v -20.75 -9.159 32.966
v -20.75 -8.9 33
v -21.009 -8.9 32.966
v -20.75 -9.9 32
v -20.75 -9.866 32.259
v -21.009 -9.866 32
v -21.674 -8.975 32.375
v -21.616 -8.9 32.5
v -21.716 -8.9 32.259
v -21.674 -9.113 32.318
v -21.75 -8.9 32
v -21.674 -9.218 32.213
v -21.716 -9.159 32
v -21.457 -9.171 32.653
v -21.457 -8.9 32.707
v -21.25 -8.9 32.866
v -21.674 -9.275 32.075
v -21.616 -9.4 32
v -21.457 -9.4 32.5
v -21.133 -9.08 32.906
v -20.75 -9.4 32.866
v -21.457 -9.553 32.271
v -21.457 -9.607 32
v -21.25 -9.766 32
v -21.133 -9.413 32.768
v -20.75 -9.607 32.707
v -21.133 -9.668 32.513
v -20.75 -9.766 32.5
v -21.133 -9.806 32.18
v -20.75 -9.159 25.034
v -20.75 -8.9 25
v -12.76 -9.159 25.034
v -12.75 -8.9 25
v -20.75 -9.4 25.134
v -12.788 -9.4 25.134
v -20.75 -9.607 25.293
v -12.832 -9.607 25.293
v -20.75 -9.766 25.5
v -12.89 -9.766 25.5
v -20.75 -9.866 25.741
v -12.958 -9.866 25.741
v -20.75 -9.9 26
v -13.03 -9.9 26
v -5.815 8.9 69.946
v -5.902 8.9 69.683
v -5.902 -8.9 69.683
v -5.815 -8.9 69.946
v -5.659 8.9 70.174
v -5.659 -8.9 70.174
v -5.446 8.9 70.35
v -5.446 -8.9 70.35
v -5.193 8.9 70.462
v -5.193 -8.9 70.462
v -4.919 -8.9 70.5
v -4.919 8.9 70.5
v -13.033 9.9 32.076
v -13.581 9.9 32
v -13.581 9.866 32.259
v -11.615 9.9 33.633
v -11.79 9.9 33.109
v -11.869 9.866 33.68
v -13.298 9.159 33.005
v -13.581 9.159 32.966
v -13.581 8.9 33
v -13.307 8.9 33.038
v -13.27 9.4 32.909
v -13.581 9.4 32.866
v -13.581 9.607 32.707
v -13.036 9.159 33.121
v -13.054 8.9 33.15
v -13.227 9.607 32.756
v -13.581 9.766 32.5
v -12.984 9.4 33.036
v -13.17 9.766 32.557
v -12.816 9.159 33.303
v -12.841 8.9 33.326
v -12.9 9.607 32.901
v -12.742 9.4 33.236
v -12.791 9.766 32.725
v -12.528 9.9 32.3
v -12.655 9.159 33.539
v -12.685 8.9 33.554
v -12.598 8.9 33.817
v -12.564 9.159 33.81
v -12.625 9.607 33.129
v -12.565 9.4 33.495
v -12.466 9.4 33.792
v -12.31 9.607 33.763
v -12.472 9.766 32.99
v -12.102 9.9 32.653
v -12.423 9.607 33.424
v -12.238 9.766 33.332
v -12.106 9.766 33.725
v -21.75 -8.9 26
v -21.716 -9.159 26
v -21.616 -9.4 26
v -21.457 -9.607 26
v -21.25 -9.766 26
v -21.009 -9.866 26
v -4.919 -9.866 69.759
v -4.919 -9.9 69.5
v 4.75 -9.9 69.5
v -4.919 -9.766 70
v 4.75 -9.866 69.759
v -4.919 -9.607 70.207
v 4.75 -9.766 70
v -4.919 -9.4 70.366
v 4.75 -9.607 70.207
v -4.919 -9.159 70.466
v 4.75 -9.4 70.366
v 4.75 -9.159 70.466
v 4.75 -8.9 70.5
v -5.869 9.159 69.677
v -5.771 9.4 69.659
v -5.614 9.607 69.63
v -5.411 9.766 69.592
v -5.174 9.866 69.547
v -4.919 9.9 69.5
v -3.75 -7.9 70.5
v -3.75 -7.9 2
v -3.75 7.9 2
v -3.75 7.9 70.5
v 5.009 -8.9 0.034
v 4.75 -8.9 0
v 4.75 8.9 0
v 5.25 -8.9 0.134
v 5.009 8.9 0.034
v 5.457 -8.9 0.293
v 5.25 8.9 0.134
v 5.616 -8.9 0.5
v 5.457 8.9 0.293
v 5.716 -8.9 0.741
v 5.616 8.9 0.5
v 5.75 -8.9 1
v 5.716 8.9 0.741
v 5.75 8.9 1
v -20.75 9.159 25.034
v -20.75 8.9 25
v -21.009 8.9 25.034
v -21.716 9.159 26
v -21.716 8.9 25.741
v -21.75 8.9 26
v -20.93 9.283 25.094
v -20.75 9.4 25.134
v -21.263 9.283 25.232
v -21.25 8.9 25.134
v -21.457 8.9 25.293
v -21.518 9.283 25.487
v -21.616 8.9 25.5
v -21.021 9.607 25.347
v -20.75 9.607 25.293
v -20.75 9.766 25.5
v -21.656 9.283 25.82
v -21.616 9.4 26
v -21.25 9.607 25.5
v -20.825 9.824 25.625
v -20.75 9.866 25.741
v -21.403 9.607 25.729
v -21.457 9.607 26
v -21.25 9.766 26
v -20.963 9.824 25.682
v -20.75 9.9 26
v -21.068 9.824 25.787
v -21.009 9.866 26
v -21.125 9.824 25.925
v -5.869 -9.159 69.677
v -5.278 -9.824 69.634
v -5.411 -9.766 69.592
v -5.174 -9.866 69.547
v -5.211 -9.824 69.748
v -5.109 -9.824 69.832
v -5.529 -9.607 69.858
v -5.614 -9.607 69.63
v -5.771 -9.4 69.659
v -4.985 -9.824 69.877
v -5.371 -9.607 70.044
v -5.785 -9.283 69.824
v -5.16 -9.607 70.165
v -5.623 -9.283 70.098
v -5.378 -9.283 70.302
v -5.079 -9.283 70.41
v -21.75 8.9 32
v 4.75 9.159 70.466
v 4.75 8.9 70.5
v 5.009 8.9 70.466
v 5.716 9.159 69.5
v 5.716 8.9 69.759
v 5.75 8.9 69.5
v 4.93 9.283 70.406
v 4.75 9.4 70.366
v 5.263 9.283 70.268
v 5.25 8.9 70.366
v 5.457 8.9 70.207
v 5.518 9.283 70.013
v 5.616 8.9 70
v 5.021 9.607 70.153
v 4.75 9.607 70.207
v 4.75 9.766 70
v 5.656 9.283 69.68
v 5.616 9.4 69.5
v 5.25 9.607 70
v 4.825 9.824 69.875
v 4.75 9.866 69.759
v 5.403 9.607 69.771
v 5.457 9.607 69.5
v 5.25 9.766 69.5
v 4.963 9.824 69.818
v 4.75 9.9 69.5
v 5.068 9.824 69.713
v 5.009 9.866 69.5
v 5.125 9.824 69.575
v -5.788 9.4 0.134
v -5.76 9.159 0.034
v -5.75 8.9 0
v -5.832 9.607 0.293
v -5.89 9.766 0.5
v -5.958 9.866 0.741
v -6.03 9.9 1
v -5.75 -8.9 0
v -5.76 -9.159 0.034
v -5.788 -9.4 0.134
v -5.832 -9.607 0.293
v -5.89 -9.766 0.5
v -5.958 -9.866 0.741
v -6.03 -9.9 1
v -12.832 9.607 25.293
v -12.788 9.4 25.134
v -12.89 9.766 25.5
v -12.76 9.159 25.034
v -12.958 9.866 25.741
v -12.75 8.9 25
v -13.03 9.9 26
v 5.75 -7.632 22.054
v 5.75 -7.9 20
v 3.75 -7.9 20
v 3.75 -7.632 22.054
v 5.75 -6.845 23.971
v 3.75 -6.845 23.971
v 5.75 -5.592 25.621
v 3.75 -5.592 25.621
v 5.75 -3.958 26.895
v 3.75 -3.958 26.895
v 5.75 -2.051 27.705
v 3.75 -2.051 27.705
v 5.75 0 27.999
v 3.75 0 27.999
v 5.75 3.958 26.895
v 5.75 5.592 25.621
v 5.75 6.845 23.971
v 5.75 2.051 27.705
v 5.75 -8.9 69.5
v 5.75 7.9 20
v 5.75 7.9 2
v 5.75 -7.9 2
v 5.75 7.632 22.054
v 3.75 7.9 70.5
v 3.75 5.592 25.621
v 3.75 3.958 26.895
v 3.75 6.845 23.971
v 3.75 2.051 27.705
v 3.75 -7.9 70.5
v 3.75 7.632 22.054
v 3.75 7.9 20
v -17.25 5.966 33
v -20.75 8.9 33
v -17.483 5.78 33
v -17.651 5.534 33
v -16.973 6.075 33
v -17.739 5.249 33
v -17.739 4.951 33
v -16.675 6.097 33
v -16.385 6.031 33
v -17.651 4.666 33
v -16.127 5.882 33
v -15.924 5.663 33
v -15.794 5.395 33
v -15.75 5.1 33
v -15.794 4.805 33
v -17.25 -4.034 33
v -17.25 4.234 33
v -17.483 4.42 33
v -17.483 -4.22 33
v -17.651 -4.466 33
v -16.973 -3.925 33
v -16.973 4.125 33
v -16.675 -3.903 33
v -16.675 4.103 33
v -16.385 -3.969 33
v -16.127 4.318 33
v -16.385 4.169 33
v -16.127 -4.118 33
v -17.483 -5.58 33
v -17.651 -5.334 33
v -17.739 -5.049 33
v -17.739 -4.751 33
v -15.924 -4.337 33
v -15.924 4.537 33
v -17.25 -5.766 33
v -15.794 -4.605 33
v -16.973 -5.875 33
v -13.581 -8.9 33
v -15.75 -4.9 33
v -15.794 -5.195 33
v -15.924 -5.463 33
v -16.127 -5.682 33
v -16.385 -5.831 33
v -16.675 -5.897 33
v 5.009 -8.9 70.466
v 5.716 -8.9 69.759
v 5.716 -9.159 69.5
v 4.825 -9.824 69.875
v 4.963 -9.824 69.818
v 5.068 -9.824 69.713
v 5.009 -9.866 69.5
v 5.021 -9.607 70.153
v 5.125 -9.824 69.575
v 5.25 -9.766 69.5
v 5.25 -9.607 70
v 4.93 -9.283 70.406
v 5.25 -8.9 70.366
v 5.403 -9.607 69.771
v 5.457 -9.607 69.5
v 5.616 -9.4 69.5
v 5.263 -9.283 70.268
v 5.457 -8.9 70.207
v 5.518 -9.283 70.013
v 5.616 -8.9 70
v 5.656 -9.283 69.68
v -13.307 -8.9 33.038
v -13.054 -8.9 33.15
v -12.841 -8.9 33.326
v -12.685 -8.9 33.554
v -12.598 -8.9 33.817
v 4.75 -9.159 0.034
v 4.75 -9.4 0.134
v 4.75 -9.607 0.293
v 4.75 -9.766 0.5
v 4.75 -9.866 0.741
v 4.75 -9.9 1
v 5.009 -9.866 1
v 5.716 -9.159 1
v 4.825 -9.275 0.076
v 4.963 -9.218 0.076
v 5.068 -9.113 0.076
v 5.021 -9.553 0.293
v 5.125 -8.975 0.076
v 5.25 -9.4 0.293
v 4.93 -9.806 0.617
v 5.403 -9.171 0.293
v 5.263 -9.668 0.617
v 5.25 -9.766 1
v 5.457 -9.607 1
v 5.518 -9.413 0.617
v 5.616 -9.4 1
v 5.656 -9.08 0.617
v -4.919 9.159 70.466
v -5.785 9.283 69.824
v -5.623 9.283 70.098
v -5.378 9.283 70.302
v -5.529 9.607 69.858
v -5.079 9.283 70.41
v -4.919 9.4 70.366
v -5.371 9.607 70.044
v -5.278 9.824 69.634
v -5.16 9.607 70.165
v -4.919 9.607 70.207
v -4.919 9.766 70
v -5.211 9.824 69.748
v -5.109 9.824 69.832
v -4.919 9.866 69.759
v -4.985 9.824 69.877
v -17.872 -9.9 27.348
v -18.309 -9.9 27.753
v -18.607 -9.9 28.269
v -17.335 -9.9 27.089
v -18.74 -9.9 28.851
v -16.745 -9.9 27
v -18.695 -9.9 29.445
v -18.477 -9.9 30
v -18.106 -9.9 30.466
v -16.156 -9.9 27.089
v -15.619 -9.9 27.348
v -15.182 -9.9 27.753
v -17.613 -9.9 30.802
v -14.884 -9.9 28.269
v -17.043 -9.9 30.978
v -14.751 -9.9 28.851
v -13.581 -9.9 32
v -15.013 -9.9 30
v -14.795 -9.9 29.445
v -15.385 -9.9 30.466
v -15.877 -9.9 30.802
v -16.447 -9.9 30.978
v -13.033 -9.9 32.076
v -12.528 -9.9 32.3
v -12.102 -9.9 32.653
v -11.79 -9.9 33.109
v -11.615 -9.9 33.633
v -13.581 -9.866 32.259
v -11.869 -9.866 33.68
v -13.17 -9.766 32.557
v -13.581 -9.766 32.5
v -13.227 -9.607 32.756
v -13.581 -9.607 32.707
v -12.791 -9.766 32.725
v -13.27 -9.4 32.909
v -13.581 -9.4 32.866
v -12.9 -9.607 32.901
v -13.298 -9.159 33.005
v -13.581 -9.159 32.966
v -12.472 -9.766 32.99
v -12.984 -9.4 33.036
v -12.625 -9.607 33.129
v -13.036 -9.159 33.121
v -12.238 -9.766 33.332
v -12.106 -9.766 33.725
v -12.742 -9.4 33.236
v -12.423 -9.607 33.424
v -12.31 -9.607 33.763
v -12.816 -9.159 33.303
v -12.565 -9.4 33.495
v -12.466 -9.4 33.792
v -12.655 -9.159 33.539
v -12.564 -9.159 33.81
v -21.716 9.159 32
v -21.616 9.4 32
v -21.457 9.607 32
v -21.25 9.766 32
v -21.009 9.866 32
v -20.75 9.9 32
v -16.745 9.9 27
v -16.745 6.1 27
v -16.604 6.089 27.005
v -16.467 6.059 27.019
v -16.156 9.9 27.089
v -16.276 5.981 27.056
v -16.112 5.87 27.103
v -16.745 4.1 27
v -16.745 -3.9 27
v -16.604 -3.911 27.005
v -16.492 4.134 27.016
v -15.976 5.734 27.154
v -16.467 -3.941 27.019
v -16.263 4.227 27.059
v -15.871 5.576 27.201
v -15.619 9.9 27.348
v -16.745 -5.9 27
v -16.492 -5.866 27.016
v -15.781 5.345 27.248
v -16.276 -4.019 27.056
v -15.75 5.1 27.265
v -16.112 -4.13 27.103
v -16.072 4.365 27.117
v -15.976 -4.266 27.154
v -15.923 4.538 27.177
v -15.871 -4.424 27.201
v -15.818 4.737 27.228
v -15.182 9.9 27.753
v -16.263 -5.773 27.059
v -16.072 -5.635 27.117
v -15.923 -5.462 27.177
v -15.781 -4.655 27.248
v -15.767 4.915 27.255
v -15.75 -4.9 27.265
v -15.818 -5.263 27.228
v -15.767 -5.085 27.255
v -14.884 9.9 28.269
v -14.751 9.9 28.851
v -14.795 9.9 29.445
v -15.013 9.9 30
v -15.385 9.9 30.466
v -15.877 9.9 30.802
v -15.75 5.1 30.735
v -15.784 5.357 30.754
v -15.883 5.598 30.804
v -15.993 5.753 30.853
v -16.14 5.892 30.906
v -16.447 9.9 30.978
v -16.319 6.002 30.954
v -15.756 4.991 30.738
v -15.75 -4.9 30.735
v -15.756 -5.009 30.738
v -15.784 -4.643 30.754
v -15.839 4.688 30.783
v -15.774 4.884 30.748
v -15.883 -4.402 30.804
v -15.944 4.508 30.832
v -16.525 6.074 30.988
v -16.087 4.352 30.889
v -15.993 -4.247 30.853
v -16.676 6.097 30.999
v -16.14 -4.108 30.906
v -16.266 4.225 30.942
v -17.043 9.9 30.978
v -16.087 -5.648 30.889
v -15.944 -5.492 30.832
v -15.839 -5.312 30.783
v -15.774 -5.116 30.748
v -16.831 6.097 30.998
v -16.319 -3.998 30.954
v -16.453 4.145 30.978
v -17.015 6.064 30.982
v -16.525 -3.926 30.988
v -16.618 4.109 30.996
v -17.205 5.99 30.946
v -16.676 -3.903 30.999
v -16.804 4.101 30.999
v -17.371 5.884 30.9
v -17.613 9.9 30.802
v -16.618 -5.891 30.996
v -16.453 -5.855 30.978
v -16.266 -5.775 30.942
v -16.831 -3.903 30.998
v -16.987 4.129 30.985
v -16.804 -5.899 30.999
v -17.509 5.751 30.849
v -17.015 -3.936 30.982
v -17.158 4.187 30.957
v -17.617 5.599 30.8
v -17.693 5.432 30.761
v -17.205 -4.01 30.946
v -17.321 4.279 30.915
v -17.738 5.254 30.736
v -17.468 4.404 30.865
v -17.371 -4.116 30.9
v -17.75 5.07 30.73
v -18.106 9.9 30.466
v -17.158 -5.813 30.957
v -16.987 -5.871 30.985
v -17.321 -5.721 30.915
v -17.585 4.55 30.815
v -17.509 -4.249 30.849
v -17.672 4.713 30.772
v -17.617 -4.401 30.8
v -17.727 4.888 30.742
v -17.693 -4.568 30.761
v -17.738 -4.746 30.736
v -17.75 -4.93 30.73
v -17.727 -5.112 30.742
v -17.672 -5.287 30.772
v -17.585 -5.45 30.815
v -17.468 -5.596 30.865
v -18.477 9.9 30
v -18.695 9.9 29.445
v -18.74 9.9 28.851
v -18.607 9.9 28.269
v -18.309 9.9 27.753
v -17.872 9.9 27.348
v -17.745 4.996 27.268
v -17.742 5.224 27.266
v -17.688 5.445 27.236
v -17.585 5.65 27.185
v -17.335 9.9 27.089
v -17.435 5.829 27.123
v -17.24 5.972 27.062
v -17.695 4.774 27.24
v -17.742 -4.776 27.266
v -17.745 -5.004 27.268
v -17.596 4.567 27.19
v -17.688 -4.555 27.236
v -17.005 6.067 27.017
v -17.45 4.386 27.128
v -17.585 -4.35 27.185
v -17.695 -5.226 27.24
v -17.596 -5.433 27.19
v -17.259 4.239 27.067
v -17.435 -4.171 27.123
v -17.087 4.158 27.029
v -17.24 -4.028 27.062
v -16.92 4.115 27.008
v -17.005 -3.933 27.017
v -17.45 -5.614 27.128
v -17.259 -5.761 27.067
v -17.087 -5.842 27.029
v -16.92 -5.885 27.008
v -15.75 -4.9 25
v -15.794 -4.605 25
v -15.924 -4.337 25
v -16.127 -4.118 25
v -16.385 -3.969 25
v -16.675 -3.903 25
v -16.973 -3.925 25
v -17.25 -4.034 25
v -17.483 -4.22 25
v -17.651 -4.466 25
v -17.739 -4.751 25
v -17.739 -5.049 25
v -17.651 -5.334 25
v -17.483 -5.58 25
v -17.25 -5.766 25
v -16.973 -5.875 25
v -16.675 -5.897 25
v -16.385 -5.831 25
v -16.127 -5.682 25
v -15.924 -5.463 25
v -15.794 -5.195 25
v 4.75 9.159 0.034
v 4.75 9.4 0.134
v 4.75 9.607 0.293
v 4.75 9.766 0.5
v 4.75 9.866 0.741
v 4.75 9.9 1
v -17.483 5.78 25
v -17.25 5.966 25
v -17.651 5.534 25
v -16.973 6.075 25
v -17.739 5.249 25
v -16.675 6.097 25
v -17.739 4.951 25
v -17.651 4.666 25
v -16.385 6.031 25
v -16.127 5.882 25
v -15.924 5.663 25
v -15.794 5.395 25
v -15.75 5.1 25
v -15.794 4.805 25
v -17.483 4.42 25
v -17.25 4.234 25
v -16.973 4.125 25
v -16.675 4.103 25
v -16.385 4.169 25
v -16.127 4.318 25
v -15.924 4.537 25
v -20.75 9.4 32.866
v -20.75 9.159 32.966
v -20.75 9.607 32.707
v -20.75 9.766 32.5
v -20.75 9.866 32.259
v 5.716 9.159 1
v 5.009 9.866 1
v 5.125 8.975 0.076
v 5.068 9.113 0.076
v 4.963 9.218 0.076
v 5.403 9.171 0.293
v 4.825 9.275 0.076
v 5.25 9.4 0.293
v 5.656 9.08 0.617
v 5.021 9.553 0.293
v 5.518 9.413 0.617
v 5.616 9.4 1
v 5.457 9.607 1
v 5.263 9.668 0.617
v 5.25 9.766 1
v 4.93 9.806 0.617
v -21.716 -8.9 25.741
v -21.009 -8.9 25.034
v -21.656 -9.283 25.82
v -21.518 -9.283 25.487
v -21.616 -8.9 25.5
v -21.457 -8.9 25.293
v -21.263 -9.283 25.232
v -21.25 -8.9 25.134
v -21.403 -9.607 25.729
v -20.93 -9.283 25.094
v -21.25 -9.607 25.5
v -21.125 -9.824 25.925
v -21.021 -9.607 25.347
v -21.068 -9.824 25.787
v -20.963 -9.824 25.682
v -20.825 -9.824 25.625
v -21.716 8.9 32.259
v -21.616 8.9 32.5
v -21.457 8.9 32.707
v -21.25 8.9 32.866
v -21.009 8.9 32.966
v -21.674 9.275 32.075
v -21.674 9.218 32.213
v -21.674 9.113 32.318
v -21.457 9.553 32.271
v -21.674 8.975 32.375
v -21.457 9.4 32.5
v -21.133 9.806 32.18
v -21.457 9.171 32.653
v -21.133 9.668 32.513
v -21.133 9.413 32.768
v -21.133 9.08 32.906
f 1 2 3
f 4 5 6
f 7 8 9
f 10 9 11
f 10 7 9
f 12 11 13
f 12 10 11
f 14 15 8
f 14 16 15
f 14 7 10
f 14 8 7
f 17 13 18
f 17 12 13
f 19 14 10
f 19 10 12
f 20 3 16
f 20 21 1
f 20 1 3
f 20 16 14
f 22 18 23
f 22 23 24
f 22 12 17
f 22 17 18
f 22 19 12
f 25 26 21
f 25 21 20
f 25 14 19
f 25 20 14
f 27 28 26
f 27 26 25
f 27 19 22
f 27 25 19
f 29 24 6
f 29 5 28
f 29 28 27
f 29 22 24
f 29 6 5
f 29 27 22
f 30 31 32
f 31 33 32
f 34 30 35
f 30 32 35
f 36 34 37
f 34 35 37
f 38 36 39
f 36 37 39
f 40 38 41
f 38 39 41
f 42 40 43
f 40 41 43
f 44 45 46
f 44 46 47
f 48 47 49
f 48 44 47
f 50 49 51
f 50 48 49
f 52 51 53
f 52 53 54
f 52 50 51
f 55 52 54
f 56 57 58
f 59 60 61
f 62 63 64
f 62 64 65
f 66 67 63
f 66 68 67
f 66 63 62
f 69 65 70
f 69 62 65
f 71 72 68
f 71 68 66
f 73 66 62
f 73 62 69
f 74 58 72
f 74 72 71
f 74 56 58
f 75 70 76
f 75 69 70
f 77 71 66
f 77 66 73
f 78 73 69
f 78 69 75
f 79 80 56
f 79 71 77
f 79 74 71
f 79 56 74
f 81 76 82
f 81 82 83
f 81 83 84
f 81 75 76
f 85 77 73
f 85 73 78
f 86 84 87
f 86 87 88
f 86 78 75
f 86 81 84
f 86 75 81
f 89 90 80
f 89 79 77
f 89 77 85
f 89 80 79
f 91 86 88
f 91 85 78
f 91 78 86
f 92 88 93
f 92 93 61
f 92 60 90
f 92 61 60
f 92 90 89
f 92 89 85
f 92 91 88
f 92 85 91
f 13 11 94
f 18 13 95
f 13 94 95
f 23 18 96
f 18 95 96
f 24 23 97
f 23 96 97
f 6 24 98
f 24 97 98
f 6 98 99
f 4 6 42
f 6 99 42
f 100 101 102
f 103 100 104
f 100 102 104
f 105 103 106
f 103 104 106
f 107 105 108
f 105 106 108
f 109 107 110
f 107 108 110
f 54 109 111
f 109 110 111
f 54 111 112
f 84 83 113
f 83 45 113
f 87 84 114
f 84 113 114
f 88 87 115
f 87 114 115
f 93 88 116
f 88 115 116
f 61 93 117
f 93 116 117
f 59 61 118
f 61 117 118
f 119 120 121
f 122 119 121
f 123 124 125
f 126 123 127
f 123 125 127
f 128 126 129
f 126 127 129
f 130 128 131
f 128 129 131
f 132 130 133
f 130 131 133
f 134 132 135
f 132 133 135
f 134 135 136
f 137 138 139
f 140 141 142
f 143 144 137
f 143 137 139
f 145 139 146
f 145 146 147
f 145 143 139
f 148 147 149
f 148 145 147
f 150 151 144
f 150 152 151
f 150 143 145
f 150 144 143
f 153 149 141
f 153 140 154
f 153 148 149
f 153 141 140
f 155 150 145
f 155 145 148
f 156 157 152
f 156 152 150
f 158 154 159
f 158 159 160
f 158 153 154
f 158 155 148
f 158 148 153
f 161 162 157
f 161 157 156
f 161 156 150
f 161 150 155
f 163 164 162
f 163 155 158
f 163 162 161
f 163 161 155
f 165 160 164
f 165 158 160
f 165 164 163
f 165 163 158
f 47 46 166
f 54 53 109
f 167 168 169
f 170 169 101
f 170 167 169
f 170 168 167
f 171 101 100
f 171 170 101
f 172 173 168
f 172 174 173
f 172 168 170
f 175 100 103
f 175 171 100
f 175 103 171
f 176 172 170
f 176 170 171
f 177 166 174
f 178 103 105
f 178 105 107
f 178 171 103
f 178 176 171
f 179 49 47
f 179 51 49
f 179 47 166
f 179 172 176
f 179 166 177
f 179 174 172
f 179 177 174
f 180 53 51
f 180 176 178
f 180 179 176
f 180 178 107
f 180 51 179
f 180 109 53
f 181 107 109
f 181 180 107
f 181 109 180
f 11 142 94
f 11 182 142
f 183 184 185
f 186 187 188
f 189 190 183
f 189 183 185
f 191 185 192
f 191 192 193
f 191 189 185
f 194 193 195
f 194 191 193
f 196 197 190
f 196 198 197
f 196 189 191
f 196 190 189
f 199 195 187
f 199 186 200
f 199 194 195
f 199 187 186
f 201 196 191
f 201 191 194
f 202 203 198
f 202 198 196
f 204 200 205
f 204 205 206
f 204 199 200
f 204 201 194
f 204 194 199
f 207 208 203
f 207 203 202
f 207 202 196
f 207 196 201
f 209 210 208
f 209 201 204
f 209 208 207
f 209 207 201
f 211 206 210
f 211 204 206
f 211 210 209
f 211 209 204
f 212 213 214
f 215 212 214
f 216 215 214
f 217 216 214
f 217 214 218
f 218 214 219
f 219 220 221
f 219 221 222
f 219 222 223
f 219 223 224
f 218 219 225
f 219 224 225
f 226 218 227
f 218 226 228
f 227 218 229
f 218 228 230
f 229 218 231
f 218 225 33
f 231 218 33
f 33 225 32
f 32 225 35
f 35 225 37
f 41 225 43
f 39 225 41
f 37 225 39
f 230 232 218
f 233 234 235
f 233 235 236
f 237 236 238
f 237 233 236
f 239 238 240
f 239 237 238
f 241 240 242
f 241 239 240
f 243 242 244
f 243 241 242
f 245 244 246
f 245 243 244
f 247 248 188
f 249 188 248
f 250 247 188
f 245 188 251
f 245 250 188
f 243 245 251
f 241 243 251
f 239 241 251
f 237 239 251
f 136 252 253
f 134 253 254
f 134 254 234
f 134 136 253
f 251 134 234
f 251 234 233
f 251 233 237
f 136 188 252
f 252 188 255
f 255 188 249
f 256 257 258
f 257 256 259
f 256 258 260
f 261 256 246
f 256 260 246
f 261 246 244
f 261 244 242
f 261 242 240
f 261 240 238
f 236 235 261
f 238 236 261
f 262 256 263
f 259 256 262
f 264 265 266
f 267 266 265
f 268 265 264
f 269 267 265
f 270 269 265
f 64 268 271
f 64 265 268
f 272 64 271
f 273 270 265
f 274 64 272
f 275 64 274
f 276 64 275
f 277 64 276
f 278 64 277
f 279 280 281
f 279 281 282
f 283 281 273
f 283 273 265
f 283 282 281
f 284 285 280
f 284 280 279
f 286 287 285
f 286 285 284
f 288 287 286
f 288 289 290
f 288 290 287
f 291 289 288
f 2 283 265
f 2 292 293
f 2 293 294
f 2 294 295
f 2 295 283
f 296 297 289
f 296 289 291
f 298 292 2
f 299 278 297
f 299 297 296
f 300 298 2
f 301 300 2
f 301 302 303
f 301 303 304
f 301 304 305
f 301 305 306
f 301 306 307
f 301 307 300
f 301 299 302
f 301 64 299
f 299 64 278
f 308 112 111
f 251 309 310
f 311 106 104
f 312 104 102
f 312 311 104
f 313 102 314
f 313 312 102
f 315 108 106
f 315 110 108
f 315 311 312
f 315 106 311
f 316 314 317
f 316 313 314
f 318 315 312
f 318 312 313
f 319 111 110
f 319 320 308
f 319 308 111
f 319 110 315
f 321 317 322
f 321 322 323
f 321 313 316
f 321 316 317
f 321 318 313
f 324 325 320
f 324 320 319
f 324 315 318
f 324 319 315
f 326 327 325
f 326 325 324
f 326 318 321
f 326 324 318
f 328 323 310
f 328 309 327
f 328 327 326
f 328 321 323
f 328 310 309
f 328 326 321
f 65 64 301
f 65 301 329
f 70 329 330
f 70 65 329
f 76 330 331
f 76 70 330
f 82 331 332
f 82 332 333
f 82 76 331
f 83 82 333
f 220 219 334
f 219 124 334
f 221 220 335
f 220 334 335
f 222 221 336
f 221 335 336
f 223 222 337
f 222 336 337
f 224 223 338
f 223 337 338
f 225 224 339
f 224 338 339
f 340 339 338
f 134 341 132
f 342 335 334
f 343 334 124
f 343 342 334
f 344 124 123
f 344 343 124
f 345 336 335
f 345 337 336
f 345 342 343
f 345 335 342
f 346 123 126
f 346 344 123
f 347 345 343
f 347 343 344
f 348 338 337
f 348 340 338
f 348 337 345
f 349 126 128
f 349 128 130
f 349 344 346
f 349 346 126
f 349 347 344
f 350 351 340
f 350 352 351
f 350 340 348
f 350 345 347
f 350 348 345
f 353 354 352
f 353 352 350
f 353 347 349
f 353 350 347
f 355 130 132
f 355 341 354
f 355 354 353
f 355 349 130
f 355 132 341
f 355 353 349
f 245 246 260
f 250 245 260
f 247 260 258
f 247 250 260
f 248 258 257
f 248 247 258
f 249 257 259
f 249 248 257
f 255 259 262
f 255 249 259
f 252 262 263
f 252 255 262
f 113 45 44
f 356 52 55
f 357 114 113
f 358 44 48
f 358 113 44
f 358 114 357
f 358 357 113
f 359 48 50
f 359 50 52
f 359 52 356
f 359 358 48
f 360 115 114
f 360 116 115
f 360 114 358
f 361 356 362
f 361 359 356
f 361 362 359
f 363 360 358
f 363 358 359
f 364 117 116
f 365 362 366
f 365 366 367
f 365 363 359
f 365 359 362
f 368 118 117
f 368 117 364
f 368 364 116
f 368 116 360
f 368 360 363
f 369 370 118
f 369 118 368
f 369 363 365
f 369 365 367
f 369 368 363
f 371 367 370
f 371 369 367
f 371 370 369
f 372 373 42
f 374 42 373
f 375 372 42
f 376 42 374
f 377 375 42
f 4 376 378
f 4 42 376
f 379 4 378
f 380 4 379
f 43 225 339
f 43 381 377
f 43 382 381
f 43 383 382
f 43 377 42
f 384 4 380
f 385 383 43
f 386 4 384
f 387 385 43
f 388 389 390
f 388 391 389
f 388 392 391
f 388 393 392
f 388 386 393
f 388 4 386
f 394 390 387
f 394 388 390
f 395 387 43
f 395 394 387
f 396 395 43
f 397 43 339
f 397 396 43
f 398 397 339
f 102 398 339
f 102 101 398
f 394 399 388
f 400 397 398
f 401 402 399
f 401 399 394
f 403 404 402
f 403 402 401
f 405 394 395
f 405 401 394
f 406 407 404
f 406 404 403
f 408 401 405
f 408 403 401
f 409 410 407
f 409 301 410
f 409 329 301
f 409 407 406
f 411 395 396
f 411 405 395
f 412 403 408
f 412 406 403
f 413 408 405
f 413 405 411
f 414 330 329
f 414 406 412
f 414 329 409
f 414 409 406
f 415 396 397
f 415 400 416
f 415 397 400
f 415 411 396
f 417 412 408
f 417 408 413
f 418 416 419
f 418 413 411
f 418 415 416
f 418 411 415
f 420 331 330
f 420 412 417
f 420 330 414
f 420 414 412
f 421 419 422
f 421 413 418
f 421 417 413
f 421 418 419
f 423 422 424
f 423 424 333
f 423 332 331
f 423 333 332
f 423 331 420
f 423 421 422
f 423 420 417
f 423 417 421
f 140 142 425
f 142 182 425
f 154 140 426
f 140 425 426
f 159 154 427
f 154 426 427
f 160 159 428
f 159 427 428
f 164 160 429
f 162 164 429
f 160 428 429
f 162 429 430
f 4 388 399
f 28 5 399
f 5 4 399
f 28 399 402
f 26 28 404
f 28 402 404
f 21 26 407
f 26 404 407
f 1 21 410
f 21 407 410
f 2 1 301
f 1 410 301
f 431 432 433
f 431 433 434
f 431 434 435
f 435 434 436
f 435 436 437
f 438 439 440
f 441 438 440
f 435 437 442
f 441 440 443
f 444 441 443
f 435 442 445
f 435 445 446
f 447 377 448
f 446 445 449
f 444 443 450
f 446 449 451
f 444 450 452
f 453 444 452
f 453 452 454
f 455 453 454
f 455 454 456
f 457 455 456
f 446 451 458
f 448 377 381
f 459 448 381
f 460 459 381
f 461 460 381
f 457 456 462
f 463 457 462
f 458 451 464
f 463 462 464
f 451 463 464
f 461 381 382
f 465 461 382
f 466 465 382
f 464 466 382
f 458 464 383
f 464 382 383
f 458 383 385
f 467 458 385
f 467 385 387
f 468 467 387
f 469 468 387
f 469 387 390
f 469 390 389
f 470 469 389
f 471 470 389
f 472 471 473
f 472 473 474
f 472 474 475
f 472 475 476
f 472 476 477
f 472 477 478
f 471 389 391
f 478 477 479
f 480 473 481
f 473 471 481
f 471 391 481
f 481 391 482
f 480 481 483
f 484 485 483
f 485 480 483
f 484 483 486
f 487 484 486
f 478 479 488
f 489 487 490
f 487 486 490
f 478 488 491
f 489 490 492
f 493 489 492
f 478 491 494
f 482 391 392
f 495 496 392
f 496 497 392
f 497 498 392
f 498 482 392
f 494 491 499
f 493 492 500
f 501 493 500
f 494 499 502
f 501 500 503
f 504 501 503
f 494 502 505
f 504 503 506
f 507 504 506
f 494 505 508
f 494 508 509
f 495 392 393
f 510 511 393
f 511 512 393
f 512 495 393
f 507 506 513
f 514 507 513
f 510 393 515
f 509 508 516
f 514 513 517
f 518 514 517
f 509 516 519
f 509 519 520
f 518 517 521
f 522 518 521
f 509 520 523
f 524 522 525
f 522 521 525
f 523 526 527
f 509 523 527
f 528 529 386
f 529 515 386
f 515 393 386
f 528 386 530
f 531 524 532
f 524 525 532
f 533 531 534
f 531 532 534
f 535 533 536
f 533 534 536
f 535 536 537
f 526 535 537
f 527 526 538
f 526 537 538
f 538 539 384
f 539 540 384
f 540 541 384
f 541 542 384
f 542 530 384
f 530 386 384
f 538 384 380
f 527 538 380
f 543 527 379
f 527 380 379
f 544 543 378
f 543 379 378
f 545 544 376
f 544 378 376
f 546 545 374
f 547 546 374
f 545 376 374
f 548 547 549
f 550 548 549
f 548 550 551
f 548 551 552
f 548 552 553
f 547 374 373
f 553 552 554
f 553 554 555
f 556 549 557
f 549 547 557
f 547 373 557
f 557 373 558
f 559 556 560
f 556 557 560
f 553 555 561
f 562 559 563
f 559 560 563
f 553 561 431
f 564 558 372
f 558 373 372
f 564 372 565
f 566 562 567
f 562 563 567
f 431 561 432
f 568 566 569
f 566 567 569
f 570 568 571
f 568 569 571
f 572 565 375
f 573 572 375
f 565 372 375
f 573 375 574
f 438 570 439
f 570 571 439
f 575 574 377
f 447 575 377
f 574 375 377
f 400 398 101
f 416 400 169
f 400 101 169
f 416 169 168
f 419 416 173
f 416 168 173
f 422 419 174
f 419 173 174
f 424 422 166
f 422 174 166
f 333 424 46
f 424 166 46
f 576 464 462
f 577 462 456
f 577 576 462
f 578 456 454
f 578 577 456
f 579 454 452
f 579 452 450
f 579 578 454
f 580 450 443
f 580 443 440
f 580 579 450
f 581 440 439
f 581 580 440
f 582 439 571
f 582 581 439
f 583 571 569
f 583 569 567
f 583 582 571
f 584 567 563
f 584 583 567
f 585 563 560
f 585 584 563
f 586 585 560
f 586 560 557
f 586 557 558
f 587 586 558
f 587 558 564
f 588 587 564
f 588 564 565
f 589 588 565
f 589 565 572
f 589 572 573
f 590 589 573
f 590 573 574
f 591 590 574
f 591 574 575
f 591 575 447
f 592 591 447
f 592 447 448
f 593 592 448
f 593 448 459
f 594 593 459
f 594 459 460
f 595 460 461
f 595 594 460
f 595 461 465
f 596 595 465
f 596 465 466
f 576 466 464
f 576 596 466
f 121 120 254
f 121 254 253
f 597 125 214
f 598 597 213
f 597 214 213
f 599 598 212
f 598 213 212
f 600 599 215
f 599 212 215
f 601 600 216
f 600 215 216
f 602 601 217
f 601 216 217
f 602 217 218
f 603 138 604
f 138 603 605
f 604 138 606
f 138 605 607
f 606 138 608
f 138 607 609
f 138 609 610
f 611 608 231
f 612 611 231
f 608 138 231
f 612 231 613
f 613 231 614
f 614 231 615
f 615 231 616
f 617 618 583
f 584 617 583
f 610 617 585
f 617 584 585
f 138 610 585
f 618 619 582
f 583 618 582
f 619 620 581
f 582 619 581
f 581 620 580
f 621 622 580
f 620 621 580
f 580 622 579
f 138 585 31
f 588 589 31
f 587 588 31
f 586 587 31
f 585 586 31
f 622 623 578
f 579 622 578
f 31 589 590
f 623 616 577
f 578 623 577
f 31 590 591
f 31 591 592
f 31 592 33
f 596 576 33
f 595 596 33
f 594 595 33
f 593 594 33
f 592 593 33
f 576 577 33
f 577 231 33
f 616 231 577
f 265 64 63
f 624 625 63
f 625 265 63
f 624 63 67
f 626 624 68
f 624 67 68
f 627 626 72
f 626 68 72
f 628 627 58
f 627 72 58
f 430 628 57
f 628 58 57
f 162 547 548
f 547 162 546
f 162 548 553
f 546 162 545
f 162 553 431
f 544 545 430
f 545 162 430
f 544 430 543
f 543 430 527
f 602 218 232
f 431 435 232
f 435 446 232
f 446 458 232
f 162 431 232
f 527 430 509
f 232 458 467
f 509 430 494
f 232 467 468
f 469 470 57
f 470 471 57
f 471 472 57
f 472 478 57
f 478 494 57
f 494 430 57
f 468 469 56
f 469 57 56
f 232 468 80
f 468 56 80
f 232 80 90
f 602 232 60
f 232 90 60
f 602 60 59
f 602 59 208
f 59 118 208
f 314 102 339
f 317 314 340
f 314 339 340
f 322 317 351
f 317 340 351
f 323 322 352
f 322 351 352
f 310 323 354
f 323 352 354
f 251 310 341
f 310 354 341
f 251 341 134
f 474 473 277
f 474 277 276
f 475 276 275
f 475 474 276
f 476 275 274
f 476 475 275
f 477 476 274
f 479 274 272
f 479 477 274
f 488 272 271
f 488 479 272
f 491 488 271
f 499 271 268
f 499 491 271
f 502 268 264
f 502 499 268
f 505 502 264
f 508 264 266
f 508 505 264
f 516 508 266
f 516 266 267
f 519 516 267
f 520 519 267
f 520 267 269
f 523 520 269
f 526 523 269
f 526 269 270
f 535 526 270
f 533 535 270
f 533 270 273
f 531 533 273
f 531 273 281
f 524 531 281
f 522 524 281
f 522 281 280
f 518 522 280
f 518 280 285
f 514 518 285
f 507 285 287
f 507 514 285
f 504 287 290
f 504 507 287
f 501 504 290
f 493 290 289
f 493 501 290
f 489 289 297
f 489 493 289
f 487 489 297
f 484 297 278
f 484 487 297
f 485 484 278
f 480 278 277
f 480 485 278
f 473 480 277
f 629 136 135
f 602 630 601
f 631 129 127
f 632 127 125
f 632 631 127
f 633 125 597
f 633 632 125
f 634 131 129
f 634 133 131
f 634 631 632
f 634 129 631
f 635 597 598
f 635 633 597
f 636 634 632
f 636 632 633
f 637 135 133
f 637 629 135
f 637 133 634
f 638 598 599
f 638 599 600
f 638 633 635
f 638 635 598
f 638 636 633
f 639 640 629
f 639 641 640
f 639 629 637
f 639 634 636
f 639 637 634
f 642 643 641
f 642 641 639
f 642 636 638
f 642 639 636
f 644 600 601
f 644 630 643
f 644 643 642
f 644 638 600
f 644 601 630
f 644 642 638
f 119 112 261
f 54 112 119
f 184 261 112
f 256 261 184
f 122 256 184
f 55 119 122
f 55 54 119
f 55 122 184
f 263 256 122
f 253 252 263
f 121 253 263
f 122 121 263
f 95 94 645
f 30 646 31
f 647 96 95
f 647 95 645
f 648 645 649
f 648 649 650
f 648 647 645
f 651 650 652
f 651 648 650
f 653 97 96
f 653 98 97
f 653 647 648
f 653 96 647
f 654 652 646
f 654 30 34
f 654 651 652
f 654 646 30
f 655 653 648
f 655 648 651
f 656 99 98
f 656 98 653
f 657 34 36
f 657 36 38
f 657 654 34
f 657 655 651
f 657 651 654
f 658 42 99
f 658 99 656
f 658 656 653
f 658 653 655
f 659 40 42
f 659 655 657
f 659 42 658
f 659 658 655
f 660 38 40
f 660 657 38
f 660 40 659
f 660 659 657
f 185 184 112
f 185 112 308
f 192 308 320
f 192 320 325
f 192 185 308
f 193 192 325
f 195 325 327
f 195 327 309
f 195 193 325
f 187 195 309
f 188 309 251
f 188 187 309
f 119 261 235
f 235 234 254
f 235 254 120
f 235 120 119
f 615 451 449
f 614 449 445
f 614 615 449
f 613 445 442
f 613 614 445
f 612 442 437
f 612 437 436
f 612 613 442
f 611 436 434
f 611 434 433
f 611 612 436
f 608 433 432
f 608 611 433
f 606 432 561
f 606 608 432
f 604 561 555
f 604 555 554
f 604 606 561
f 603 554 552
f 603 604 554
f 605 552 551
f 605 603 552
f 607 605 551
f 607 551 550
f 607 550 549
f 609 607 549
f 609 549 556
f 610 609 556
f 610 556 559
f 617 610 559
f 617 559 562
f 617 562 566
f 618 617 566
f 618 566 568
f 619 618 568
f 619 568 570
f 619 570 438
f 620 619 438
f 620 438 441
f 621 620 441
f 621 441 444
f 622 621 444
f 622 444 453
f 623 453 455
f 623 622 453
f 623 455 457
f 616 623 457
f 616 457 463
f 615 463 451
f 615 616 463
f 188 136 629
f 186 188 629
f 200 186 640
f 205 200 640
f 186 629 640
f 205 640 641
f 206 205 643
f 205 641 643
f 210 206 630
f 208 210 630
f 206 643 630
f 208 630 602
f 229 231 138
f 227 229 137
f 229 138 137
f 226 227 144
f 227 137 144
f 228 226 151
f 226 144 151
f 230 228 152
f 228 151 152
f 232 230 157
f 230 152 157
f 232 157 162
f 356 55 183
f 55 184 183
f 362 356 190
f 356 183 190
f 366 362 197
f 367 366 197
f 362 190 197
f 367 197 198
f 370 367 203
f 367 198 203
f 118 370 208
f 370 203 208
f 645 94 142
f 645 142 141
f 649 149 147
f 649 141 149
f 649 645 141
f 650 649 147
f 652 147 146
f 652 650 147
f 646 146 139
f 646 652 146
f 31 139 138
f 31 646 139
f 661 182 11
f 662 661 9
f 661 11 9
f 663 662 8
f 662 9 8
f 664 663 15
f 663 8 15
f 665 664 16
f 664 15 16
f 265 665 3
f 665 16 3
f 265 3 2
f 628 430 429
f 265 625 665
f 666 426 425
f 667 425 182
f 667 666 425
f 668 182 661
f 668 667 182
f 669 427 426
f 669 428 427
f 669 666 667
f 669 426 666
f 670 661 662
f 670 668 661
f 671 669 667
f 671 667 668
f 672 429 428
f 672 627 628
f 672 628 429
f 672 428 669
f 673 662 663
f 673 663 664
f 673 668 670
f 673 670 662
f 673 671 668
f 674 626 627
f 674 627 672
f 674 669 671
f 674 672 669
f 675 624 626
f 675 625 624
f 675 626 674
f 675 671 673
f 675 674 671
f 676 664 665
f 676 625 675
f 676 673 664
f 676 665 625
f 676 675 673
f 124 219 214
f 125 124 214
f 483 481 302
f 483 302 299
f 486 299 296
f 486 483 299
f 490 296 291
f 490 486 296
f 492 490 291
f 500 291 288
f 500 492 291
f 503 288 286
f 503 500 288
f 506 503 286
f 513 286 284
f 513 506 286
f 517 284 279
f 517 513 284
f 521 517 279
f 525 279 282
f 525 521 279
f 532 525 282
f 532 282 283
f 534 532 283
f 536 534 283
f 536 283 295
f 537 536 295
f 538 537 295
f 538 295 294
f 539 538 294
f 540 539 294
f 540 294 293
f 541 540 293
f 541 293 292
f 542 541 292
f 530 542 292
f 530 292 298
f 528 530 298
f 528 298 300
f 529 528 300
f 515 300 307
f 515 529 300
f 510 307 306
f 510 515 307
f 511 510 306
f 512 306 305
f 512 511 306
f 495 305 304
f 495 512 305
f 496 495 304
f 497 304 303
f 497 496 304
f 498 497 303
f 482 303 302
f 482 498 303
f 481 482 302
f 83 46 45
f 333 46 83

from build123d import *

# Parameters (mm, degrees)
CROQUIS1_W                 = 19.8
CROQUIS1_H                 = 11.5
SALIENTE_EXTRUIR1_DEPTH    = 70.5
VACIADO1_T                 = -2
CROQUIS5_W                 = 15.8
CROQUIS5_H                 = 2
SALIENTE_EXTRUIR2_DEPTH    = 2
CROQUIS6_W                 = 19.8
CROQUIS6_H                 = 8
SALIENTE_EXTRUIR4_DEPTH    = 16
SALIENTE_EXTRUIR5_DEPTH    = 19.8
CROQUIS10_R                = 2
CORTAR_EXTRUIR4_DEPTH      = 19.8
CORTAR_EXTRUIR3_DEPTH      = 43.653516854
CORTAR_EXTRUIR3_DEPTH_BACK = 43.653516854
CROQUIS8_R                 = 1
CROQUIS11_W                = 15.8
CROQUIS11_H                = 26
CORTAR_EXTRUIR5_DEPTH      = 2
REDONDEO2_R                = 8
REDONDEO4_R                = 1
REDONDEO5_R                = 1
REDONDEO6_R                = 1
REDONDEO7_R                = 1
REDONDEO8_R                = 1


with BuildPart() as part:
    # Croquis1 → Saliente-Extruir1 (new body)
    with BuildSketch(Plane(origin=(0, 0, 0), x_dir=(0, 1, 0), z_dir=(0, 0, 1))):
        Rectangle(CROQUIS1_W, CROQUIS1_H)
    extrude(amount=SALIENTE_EXTRUIR1_DEPTH)

    # Vaciado1
    vaciado1_openings = [part.faces().sort_by_distance(p)[0] for p in [
        (0, 0, 70.5),
    ]]
    offset(amount=VACIADO1_T, openings=vaciado1_openings, kind=Kind.INTERSECTION)

    # Croquis5 → Saliente-Extruir2 (add)
    with BuildSketch(Plane.YZ.offset(5.75)):
        with Locations((0, 69.5)):
            Rectangle(CROQUIS5_W, CROQUIS5_H)
    extrude(amount=-SALIENTE_EXTRUIR2_DEPTH)

    # Croquis6 → Saliente-Extruir4 (add)
    with BuildSketch(Plane(origin=(-5.75, 0, 0), x_dir=(0, -1, 0), z_dir=(-1, 0, 0))):
        with Locations((0, 29)):
            Rectangle(CROQUIS6_W, CROQUIS6_H)
    extrude(amount=SALIENTE_EXTRUIR4_DEPTH)

    # Croquis9 → Saliente-Extruir5 (add)
    with BuildSketch(Plane.XZ.offset(9.9)):
        Polygon((-5.75, 70.5), (-12.75, 33), (-5.75, 33), align=None)
        Polygon((-5.75, 0), (-12.75, 25), (-5.75, 25), align=None)
    extrude(amount=-SALIENTE_EXTRUIR5_DEPTH)

    # Croquis10 → Cortar-Extruir4 (cut)
    with BuildSketch(Plane.XZ.offset(9.9)):
        with Locations(Location((-16.745253682, 29, 0), (0, 0, 270))):
            Circle(CROQUIS10_R)
    extrude(amount=-CORTAR_EXTRUIR4_DEPTH, mode=Mode.SUBTRACT)

    # Croquis8 → Cortar-Extruir3 (cut, two sides: drawn at the far end of the back side and taken through both)
    with BuildSketch(Plane(origin=(-4, 0, 33), x_dir=(1, 0, 0), z_dir=(0, 0, 1)).offset(-CORTAR_EXTRUIR3_DEPTH_BACK)):
        with Locations((-12.75, 5.1)):
            Circle(CROQUIS8_R)
        with Locations((-12.75, -4.9)):
            Circle(CROQUIS8_R)
    extrude(amount=CORTAR_EXTRUIR3_DEPTH + CORTAR_EXTRUIR3_DEPTH_BACK, mode=Mode.SUBTRACT)

    # Croquis11 → Cortar-Extruir5 (cut)
    with BuildSketch(Plane.YZ.offset(5.75)):
        with Locations((0, 15)):
            Rectangle(CROQUIS11_W, CROQUIS11_H)
    extrude(amount=-CORTAR_EXTRUIR5_DEPTH, mode=Mode.SUBTRACT)

    # Redondeo2
    # the kernel refuses this fillet: 8 mm, written as the material it adds along each edge
    with BuildSketch(Plane(origin=(5.75, -7.9, 28), x_dir=(0, 1, 0), z_dir=(-1, 0, 0)), Plane(origin=(5.75, 7.9, 28), x_dir=(0, 0, -1), z_dir=(-1, 0, 0))) as redondeo2_piece_1:
        with BuildLine():
            CenterArc((REDONDEO2_R, REDONDEO2_R), REDONDEO2_R, 180, 90)
            Line((0, REDONDEO2_R), (0, 0))
            Line((0, 0), (REDONDEO2_R, 0))
        make_face()
    extrude(amount=2)

    # Redondeo4
    redondeo4_edges = [part.edges().sort_by_distance(p)[0] for p in [
        (-12.75, 0, 33),
    ]]
    fillet(redondeo4_edges, radius=REDONDEO4_R)

    # Redondeo5
    redondeo5_edges = [part.edges().sort_by_distance(p)[0] for p in [
        (5.75, 0, 70.5),
        (-5.75, 0, 70.5),
    ]]
    fillet(redondeo5_edges, radius=REDONDEO5_R)

    # Redondeo6
    redondeo6_edges = [part.edges().sort_by_distance(p)[0] for p in [
        (-12.941660805, -9.9, 33.230748054),
        (-12.941660805, 9.9, 33.230748054),
        (-9.25, 9.9, 51.75),
        (-9.25, -9.9, 51.75),
        (-0.084696812, 9.9, 70.5),
        (5.75, 9.9, 34.75),
        (5.457106781, 9.9, 70.207106781),
        (-5.558339195, 9.9, 70.269251946),
        (-0.084696812, -9.9, 70.5),
        (5.75, -9.9, 34.75),
        (5.457106781, -9.9, 70.207106781),
        (-5.558339195, -9.9, 70.269251946),
        (-17.665303188, 9.9, 33),
        (-17.665303188, -9.9, 33),
    ]]
    fillet(redondeo6_edges, radius=REDONDEO6_R)

    # Redondeo7
    redondeo7_edges = [part.edges().sort_by_distance(p)[0] for p in [
        (-0.5, 9.9, 0),
        (5.75, 0, 0),
        (-0.5, -9.9, 0),
        (5.457106781, -9.607106781, 0),
        (5.457106781, 9.607106781, 0),
        (-21.75, 0, 25),
    ]]
    fillet(redondeo7_edges, radius=REDONDEO7_R)

    # Redondeo8
    redondeo8_edges = [part.edges().sort_by_distance(p)[0] for p in [
        (-21.75, 9.9, 29),
        (-21.75, 0, 33),
        (-21.75, -9.607106781, 32.707106781),
        (-21.75, 9.607106781, 32.707106781),
        (-21.75, -9.9, 29),
        (-16.75, -9.9, 25),
        (-21.457106781, -9.9, 25.292893219),
        (-16.75, 9.9, 25),
        (-21.457106781, 9.9, 25.292893219),
    ]]
    fillet(redondeo8_edges, radius=REDONDEO8_R)


solid = part.part
